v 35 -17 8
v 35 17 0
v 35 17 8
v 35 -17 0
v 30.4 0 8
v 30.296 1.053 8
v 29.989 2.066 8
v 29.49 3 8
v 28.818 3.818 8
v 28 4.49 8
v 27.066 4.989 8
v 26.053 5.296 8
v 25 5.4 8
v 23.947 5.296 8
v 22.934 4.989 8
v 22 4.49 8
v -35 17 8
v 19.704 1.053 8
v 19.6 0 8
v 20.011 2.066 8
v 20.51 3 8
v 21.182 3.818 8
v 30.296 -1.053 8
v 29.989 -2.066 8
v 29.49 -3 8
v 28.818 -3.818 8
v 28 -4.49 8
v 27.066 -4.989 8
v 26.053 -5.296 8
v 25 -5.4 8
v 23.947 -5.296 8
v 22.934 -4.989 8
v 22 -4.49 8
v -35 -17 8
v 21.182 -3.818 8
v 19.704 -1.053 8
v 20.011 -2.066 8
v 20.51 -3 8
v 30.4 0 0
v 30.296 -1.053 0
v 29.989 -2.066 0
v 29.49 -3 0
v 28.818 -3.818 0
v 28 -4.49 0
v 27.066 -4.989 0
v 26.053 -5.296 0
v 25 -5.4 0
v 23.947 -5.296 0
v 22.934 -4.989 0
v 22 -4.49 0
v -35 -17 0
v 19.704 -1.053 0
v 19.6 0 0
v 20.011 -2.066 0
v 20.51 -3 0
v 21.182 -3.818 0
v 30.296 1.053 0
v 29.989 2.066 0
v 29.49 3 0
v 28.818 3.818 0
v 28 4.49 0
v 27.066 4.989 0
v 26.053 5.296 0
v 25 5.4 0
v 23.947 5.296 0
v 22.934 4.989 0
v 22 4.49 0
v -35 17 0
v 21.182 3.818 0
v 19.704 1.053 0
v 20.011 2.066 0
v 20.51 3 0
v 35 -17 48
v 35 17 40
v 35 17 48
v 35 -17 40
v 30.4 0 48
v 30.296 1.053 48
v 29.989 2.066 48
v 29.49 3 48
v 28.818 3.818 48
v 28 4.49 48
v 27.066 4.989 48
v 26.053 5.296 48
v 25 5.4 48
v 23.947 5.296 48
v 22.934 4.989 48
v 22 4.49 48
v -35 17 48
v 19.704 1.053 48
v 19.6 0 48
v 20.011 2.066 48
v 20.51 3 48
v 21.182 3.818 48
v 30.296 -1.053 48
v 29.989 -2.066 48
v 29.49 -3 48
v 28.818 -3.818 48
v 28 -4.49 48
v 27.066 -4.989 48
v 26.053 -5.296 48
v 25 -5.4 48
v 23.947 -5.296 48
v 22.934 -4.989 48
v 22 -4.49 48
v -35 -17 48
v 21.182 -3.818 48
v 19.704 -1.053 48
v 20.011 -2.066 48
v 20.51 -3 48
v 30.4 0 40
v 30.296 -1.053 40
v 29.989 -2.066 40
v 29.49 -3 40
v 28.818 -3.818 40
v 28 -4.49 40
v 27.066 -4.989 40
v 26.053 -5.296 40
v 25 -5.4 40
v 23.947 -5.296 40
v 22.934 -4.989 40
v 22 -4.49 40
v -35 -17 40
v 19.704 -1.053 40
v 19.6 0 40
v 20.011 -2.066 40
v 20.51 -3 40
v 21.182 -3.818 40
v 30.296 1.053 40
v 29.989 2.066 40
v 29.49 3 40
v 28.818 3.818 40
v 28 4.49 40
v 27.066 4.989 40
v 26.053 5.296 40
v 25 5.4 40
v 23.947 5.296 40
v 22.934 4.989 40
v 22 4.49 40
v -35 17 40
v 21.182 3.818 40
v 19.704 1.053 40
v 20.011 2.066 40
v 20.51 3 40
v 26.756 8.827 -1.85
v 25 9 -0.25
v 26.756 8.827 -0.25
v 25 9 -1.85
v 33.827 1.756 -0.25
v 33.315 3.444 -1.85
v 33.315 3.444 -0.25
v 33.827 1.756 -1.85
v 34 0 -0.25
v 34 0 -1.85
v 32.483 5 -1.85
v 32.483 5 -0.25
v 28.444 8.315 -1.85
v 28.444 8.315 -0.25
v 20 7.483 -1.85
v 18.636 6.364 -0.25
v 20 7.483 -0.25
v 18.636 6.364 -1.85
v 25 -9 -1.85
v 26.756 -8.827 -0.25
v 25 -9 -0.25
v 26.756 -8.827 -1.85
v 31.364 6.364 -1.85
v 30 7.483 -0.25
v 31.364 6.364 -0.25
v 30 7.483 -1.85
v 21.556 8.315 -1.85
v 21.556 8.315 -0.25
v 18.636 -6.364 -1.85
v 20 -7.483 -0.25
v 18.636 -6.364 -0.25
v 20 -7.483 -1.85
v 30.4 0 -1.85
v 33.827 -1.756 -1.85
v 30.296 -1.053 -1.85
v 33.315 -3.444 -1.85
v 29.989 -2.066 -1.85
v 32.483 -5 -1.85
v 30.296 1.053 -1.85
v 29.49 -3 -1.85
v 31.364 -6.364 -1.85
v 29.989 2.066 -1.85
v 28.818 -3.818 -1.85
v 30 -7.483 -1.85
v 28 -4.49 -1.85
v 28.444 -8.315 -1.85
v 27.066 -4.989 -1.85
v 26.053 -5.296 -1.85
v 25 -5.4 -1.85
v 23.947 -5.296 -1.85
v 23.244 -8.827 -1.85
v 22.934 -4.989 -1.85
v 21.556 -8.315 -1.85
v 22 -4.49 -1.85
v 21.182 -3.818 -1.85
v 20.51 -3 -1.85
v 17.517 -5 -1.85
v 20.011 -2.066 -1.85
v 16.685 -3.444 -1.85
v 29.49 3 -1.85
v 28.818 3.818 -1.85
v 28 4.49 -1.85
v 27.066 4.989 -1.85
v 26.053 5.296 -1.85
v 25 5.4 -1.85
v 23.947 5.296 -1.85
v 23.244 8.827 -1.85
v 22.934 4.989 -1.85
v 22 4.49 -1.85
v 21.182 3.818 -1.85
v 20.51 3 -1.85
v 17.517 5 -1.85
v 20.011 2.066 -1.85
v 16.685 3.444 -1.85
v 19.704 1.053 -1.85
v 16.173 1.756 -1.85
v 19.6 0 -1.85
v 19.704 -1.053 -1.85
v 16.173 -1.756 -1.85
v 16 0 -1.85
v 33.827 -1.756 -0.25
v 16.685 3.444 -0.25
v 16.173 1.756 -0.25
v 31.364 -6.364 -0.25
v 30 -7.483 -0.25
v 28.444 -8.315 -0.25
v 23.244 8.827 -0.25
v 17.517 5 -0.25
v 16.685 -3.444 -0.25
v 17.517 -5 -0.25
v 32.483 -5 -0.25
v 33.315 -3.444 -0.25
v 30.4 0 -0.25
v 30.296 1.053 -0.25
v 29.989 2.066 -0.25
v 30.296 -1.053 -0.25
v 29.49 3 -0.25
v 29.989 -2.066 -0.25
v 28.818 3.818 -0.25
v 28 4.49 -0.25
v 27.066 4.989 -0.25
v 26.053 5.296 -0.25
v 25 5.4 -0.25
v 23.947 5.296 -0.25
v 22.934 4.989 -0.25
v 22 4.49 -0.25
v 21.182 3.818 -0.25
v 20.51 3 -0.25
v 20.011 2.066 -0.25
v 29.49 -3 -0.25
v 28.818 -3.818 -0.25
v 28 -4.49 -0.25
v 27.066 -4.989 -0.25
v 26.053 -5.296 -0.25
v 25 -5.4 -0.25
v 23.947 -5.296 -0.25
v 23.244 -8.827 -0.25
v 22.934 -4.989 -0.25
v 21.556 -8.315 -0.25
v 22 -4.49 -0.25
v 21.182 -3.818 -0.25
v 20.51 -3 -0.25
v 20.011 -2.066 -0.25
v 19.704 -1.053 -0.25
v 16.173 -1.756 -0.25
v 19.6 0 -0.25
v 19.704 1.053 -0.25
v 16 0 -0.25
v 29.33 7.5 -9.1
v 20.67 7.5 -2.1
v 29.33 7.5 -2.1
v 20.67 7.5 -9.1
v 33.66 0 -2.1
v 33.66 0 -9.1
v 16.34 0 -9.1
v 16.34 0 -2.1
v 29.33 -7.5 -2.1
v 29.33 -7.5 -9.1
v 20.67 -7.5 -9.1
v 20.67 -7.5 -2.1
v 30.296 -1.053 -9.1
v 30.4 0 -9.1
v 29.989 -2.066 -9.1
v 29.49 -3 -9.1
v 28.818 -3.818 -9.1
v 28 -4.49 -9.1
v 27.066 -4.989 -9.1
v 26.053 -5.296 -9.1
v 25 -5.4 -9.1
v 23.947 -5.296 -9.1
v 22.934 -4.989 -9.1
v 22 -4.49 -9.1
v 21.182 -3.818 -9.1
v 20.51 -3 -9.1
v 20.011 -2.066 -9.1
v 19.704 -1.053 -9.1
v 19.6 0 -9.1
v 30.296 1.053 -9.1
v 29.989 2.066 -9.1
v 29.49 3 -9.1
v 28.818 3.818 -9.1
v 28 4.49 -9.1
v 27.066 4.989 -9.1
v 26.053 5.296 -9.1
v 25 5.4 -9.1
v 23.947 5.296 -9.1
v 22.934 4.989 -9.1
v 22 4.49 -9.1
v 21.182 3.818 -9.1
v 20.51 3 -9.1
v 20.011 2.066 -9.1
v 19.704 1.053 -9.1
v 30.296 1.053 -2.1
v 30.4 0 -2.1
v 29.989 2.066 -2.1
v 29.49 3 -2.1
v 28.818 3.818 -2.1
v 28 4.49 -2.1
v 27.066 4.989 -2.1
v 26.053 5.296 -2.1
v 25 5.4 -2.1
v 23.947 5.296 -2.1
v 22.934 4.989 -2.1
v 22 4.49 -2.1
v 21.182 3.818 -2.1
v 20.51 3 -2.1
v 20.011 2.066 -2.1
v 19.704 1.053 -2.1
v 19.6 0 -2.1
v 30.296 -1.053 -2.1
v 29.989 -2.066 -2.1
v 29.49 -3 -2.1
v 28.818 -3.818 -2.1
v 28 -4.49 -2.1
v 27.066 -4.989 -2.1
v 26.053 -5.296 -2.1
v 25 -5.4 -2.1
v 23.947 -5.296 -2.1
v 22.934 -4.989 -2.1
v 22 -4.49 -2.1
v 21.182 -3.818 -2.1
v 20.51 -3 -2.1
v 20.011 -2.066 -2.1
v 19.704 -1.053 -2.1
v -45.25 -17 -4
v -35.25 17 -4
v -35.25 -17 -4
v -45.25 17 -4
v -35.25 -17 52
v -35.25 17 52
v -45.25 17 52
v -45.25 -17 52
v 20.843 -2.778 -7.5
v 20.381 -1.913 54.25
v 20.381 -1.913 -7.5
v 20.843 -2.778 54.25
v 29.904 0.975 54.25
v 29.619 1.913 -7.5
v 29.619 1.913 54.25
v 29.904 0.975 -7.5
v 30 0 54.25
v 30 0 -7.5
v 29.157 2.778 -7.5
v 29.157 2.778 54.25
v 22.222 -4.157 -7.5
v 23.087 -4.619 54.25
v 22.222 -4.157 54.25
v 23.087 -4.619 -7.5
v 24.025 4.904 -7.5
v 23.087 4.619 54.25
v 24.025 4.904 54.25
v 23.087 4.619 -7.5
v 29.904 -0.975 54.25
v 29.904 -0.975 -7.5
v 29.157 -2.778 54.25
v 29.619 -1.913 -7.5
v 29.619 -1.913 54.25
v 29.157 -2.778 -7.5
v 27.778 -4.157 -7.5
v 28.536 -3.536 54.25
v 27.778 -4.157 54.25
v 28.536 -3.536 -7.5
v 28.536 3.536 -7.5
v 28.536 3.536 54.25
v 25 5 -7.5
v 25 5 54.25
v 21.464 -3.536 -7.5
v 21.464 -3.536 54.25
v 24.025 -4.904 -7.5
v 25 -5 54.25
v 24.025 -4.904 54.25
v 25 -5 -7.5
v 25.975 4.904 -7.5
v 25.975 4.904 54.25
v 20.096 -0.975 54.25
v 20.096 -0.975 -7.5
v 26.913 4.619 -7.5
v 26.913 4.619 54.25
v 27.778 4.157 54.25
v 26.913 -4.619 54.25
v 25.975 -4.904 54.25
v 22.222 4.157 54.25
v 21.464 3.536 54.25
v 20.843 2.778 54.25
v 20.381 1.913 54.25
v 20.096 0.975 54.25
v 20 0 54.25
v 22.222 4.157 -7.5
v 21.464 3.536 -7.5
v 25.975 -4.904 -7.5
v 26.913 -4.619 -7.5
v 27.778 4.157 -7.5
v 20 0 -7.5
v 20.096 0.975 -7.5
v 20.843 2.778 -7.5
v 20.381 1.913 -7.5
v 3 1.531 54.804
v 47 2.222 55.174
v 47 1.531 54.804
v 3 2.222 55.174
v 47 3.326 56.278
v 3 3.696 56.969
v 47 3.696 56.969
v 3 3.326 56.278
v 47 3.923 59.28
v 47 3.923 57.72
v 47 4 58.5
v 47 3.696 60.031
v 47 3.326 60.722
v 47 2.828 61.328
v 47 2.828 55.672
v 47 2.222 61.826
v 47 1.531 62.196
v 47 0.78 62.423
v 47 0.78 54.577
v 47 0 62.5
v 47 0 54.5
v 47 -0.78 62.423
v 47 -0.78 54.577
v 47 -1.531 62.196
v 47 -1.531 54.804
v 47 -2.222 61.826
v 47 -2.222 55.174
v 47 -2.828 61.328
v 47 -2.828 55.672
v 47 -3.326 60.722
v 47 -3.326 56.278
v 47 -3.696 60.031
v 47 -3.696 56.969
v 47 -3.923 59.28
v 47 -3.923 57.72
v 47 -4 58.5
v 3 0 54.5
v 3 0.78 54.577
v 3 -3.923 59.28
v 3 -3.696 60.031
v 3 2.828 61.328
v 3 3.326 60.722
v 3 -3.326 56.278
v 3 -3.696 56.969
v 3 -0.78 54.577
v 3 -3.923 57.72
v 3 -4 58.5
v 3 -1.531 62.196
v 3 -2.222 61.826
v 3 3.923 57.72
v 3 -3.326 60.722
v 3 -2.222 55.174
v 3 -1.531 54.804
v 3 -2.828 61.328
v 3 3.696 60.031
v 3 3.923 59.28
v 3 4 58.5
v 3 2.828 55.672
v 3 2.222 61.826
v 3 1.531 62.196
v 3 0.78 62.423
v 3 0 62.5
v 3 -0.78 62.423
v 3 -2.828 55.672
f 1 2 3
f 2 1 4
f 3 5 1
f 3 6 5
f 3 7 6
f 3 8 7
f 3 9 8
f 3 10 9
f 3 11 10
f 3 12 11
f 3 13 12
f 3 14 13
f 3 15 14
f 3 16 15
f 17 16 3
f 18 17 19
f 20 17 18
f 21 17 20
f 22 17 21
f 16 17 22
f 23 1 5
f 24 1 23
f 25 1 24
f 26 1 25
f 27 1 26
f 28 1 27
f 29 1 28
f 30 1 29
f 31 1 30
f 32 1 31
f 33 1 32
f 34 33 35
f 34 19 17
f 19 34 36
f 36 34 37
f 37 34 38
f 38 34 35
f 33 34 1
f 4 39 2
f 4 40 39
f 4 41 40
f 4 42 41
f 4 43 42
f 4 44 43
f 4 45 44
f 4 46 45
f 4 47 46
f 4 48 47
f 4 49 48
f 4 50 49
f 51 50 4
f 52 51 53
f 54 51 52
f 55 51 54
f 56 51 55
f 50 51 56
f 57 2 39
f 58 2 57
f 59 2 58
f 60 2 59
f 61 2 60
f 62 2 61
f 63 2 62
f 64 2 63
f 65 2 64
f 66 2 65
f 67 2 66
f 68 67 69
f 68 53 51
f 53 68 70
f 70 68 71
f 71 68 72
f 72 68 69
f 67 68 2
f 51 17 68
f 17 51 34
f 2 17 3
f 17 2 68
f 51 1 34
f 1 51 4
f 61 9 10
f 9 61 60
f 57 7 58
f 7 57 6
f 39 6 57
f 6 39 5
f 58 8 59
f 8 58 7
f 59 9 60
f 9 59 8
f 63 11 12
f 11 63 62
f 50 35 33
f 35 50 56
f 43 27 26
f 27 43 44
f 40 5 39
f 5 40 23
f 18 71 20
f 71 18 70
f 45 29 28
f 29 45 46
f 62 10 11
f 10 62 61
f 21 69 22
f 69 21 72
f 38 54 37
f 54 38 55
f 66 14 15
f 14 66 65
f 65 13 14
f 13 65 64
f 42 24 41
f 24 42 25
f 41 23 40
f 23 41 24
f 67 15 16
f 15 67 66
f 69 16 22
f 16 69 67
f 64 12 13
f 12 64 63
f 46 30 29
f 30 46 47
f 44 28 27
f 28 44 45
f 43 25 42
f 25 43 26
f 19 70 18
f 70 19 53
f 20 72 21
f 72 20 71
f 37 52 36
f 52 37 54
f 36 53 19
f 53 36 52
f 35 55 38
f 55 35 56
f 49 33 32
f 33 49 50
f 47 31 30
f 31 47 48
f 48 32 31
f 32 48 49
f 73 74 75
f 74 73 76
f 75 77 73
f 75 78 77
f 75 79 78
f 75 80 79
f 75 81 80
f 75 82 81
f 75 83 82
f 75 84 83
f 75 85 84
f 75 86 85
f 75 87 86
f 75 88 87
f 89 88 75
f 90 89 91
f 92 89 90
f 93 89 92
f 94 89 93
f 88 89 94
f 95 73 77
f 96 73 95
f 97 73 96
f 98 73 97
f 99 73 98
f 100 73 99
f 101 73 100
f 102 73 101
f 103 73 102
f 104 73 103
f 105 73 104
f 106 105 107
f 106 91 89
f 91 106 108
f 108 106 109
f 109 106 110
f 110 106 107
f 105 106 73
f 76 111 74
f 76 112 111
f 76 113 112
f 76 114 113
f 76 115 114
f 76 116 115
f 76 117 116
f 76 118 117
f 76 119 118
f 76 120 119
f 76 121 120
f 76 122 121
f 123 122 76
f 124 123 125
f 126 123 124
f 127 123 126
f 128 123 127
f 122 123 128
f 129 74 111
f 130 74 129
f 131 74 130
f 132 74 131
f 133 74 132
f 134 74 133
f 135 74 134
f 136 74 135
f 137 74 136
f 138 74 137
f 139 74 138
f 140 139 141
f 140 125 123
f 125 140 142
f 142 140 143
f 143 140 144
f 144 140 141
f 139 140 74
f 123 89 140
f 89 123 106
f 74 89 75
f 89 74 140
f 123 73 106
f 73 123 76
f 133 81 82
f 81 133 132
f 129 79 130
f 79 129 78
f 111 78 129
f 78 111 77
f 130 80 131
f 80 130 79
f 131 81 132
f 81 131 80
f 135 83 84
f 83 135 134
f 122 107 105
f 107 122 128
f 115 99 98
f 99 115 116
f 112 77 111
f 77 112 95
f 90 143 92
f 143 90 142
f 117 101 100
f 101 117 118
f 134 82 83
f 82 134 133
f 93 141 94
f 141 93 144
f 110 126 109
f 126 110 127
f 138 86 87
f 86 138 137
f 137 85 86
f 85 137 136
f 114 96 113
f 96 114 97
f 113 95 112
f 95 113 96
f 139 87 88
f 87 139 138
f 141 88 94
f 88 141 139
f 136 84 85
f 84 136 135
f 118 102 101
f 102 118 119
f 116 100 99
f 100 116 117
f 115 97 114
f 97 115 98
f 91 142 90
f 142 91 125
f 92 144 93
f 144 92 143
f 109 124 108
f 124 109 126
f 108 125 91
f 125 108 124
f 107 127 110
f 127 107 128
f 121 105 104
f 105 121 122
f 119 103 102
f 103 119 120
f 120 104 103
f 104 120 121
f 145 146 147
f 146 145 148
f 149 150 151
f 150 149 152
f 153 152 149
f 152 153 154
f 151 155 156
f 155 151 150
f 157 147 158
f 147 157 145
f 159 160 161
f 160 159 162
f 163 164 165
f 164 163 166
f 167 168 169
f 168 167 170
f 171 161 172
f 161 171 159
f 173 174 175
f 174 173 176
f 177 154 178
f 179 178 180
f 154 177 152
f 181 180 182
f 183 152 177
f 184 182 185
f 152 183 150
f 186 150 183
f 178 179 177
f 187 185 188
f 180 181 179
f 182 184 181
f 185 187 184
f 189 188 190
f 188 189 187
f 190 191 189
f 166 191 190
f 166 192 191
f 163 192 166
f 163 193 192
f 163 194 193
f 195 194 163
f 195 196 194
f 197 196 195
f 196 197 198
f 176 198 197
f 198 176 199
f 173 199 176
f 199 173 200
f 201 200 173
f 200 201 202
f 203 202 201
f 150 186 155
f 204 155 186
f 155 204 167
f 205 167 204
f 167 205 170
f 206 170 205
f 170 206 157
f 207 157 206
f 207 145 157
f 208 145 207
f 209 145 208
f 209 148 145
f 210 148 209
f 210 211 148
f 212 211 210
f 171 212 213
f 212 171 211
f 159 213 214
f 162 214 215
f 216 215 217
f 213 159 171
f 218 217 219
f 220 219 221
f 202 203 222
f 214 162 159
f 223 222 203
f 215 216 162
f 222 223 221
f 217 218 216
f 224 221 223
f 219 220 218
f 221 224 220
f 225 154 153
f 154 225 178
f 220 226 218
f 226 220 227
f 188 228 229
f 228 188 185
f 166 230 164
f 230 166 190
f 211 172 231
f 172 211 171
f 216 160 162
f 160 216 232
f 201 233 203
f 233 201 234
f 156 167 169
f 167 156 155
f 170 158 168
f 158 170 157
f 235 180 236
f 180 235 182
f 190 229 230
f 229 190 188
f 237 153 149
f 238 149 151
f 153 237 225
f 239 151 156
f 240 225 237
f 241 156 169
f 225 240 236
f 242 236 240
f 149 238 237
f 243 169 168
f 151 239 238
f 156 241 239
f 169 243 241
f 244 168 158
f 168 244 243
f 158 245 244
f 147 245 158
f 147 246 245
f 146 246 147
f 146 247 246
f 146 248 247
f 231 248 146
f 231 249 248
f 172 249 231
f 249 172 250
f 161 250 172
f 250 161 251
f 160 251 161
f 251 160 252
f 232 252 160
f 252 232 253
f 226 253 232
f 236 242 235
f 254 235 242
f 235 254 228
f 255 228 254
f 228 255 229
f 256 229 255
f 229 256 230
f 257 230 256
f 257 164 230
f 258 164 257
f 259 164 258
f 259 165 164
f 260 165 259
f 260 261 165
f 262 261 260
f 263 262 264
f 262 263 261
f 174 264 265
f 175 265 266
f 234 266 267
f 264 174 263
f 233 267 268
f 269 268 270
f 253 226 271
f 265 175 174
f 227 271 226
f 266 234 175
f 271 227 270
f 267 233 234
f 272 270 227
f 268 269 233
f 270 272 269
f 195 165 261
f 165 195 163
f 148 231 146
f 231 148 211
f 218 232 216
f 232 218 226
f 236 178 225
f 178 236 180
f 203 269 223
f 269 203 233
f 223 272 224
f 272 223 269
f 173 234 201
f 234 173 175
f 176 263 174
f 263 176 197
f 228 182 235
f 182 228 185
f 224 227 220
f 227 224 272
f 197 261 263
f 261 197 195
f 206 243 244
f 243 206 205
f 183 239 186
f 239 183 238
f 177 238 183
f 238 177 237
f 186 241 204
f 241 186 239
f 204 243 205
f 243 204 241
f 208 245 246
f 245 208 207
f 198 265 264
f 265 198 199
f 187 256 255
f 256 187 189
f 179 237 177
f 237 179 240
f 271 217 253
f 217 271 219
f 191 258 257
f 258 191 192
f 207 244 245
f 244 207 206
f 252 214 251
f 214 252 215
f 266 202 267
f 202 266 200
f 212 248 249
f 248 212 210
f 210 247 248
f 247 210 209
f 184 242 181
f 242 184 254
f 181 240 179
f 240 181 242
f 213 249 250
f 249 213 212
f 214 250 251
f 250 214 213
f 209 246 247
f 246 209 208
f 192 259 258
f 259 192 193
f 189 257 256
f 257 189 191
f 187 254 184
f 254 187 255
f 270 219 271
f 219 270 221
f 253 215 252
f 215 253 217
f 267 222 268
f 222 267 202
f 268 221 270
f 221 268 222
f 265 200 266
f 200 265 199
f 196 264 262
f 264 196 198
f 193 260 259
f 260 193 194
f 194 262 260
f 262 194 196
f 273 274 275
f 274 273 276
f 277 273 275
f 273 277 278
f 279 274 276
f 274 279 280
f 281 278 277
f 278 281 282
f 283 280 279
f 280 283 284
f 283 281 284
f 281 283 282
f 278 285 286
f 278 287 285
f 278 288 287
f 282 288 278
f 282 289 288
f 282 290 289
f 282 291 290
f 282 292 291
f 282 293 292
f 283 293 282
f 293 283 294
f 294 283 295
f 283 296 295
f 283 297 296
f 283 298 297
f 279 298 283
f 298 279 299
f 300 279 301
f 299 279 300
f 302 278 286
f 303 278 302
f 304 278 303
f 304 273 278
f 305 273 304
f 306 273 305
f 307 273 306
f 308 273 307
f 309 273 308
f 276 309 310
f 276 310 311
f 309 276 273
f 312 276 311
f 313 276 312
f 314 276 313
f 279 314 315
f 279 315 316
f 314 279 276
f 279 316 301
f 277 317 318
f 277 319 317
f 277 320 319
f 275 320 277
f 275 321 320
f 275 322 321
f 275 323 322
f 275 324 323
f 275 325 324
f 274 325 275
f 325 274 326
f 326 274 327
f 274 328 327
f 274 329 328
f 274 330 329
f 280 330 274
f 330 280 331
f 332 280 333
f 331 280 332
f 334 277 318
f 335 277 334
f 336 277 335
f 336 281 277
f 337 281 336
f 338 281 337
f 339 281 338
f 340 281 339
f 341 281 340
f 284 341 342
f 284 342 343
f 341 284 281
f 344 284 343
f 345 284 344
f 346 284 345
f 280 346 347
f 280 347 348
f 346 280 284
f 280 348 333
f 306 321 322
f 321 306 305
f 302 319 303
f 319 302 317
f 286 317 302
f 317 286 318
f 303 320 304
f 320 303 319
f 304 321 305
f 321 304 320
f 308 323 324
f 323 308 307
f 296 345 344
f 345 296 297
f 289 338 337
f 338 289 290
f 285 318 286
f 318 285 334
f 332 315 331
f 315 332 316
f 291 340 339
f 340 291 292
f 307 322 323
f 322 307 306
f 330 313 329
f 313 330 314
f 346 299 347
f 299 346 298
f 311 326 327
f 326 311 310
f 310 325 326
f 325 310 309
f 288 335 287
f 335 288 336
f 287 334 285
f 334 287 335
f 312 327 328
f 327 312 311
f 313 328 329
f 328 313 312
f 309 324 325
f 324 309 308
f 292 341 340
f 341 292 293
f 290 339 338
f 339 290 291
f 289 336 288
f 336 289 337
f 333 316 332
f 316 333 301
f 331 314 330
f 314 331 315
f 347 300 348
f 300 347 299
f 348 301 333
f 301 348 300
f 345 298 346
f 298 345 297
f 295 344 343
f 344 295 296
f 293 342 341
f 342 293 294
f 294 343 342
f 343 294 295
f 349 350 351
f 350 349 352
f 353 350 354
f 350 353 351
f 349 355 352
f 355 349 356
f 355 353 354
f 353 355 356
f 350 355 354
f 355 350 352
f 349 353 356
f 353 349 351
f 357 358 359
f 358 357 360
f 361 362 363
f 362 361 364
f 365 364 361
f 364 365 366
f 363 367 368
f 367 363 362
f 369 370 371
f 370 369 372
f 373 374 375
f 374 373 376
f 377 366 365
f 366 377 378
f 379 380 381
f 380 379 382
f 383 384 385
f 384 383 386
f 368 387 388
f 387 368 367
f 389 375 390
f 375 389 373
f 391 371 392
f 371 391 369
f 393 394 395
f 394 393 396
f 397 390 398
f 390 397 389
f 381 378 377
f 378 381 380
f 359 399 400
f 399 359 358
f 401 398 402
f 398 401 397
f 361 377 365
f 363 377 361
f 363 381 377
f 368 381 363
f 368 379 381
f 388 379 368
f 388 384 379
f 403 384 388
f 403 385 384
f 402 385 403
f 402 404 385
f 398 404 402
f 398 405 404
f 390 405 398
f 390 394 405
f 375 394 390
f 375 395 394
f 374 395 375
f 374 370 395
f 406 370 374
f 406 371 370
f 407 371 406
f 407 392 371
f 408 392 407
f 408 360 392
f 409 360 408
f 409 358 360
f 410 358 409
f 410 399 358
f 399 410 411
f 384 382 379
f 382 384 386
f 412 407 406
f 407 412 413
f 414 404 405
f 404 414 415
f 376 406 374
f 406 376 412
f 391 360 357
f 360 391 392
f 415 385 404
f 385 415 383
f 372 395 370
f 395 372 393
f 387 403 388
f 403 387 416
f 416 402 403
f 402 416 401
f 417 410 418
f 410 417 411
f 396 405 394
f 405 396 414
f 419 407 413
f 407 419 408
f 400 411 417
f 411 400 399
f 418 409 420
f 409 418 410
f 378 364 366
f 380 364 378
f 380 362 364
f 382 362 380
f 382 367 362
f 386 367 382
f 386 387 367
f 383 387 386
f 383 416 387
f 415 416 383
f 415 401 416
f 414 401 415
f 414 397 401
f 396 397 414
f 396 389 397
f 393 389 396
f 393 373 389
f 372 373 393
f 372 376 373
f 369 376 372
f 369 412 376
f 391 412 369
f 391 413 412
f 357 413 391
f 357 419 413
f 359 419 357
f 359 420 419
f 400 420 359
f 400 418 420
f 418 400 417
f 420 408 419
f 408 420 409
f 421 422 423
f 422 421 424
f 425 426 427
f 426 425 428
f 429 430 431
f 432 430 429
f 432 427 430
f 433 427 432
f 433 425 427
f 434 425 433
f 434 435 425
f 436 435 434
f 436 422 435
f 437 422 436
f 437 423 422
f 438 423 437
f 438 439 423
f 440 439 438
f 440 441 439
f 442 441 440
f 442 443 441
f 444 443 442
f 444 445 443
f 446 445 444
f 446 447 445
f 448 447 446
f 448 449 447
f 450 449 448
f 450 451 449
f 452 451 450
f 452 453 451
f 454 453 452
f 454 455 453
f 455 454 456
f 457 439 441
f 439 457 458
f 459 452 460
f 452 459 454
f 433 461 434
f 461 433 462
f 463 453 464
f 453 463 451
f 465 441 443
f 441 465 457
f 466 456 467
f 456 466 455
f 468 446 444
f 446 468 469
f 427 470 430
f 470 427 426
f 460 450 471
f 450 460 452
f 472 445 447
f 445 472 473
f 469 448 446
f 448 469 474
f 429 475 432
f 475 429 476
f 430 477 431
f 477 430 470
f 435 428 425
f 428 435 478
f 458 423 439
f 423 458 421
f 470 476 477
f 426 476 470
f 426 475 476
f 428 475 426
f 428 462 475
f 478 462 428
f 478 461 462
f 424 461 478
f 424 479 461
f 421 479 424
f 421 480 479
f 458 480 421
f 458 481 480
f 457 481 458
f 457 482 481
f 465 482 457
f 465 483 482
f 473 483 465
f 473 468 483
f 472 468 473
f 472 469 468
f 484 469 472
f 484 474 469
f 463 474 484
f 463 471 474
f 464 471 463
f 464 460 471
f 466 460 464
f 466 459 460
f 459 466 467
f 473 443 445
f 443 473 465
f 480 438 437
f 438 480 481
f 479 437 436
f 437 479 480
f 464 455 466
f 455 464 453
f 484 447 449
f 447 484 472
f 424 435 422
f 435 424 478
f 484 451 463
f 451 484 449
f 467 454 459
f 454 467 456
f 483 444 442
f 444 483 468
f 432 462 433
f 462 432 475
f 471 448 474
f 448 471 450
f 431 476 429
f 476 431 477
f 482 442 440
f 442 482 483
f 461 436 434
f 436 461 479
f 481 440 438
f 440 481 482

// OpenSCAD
$fn = 32;

// ------------------------------------------------------------------------
// C clamp: throat 40 mm, screw d10
// Every part is its own module, assembly() places every instance.
// ------------------------------------------------------------------------

// --- part 1 ---
module clamp_arm() {
  difference() {
    translate([-35, -17, 0]) cube([70, 34, 8]);
    translate([25, 0, -1]) cylinder(h = 10, d = 10.8);
  }
}

// --- part 2 ---
module clamp_spine() {
  difference() {
    translate([-28, -17, 0]) cube([56, 34, 10]);
  }
}

// --- part 3 ---
module clamp_screw() {
  translate([0, 0, -30.875]) cylinder(h = 61.75, d = 10);
}

// --- part 4 ---
module clamp_washer() {
  difference() {
      translate([0, 0, 0]) cylinder(h = 1.6, d = 18);
      translate([0, 0, -1]) cylinder(h = 3.6, d = 10.8);
    }
}

// --- part 5 ---
module clamp_nut() {
  difference() {
    linear_extrude(height = 7) polygon(points = [[8.66, 0], [4.33, 7.5], [-4.33, 7.5], [-8.66, 0], [-4.33, -7.5], [4.33, -7.5]]);
    translate([0, 0, -1]) cylinder(h = 9, d = 10.8);
  }
}

// --- part 6 ---
module tommy_bar() {
  translate([0, 0, -22]) cylinder(h = 44, d = 8);
}

// --- assembly ---
module assembly() {
  color([0.80, 0.24, 0.20]) translate([0, 0, 0]) rotate([0, 0, 0]) clamp_arm();
  color([0.20, 0.45, 0.75]) translate([0, 0, 40]) rotate([0, 0, 0]) clamp_arm();
  color([0.25, 0.62, 0.32]) translate([-45.25, 0, 24]) rotate([0, 90, 0]) clamp_spine();
  color([0.92, 0.70, 0.18]) translate([25, 0, 23.375]) rotate([0, 0, 0]) clamp_screw();
  color([0.58, 0.35, 0.70]) translate([25, 0, -1.85]) rotate([0, 0, 0]) clamp_washer();
  color([0.16, 0.66, 0.66]) translate([25, 0, -9.1]) rotate([0, 0, 0]) clamp_nut();
  color([0.85, 0.48, 0.18]) translate([25, 0, 58.5]) rotate([0, 90, 0]) tommy_bar();
}

assembly();
